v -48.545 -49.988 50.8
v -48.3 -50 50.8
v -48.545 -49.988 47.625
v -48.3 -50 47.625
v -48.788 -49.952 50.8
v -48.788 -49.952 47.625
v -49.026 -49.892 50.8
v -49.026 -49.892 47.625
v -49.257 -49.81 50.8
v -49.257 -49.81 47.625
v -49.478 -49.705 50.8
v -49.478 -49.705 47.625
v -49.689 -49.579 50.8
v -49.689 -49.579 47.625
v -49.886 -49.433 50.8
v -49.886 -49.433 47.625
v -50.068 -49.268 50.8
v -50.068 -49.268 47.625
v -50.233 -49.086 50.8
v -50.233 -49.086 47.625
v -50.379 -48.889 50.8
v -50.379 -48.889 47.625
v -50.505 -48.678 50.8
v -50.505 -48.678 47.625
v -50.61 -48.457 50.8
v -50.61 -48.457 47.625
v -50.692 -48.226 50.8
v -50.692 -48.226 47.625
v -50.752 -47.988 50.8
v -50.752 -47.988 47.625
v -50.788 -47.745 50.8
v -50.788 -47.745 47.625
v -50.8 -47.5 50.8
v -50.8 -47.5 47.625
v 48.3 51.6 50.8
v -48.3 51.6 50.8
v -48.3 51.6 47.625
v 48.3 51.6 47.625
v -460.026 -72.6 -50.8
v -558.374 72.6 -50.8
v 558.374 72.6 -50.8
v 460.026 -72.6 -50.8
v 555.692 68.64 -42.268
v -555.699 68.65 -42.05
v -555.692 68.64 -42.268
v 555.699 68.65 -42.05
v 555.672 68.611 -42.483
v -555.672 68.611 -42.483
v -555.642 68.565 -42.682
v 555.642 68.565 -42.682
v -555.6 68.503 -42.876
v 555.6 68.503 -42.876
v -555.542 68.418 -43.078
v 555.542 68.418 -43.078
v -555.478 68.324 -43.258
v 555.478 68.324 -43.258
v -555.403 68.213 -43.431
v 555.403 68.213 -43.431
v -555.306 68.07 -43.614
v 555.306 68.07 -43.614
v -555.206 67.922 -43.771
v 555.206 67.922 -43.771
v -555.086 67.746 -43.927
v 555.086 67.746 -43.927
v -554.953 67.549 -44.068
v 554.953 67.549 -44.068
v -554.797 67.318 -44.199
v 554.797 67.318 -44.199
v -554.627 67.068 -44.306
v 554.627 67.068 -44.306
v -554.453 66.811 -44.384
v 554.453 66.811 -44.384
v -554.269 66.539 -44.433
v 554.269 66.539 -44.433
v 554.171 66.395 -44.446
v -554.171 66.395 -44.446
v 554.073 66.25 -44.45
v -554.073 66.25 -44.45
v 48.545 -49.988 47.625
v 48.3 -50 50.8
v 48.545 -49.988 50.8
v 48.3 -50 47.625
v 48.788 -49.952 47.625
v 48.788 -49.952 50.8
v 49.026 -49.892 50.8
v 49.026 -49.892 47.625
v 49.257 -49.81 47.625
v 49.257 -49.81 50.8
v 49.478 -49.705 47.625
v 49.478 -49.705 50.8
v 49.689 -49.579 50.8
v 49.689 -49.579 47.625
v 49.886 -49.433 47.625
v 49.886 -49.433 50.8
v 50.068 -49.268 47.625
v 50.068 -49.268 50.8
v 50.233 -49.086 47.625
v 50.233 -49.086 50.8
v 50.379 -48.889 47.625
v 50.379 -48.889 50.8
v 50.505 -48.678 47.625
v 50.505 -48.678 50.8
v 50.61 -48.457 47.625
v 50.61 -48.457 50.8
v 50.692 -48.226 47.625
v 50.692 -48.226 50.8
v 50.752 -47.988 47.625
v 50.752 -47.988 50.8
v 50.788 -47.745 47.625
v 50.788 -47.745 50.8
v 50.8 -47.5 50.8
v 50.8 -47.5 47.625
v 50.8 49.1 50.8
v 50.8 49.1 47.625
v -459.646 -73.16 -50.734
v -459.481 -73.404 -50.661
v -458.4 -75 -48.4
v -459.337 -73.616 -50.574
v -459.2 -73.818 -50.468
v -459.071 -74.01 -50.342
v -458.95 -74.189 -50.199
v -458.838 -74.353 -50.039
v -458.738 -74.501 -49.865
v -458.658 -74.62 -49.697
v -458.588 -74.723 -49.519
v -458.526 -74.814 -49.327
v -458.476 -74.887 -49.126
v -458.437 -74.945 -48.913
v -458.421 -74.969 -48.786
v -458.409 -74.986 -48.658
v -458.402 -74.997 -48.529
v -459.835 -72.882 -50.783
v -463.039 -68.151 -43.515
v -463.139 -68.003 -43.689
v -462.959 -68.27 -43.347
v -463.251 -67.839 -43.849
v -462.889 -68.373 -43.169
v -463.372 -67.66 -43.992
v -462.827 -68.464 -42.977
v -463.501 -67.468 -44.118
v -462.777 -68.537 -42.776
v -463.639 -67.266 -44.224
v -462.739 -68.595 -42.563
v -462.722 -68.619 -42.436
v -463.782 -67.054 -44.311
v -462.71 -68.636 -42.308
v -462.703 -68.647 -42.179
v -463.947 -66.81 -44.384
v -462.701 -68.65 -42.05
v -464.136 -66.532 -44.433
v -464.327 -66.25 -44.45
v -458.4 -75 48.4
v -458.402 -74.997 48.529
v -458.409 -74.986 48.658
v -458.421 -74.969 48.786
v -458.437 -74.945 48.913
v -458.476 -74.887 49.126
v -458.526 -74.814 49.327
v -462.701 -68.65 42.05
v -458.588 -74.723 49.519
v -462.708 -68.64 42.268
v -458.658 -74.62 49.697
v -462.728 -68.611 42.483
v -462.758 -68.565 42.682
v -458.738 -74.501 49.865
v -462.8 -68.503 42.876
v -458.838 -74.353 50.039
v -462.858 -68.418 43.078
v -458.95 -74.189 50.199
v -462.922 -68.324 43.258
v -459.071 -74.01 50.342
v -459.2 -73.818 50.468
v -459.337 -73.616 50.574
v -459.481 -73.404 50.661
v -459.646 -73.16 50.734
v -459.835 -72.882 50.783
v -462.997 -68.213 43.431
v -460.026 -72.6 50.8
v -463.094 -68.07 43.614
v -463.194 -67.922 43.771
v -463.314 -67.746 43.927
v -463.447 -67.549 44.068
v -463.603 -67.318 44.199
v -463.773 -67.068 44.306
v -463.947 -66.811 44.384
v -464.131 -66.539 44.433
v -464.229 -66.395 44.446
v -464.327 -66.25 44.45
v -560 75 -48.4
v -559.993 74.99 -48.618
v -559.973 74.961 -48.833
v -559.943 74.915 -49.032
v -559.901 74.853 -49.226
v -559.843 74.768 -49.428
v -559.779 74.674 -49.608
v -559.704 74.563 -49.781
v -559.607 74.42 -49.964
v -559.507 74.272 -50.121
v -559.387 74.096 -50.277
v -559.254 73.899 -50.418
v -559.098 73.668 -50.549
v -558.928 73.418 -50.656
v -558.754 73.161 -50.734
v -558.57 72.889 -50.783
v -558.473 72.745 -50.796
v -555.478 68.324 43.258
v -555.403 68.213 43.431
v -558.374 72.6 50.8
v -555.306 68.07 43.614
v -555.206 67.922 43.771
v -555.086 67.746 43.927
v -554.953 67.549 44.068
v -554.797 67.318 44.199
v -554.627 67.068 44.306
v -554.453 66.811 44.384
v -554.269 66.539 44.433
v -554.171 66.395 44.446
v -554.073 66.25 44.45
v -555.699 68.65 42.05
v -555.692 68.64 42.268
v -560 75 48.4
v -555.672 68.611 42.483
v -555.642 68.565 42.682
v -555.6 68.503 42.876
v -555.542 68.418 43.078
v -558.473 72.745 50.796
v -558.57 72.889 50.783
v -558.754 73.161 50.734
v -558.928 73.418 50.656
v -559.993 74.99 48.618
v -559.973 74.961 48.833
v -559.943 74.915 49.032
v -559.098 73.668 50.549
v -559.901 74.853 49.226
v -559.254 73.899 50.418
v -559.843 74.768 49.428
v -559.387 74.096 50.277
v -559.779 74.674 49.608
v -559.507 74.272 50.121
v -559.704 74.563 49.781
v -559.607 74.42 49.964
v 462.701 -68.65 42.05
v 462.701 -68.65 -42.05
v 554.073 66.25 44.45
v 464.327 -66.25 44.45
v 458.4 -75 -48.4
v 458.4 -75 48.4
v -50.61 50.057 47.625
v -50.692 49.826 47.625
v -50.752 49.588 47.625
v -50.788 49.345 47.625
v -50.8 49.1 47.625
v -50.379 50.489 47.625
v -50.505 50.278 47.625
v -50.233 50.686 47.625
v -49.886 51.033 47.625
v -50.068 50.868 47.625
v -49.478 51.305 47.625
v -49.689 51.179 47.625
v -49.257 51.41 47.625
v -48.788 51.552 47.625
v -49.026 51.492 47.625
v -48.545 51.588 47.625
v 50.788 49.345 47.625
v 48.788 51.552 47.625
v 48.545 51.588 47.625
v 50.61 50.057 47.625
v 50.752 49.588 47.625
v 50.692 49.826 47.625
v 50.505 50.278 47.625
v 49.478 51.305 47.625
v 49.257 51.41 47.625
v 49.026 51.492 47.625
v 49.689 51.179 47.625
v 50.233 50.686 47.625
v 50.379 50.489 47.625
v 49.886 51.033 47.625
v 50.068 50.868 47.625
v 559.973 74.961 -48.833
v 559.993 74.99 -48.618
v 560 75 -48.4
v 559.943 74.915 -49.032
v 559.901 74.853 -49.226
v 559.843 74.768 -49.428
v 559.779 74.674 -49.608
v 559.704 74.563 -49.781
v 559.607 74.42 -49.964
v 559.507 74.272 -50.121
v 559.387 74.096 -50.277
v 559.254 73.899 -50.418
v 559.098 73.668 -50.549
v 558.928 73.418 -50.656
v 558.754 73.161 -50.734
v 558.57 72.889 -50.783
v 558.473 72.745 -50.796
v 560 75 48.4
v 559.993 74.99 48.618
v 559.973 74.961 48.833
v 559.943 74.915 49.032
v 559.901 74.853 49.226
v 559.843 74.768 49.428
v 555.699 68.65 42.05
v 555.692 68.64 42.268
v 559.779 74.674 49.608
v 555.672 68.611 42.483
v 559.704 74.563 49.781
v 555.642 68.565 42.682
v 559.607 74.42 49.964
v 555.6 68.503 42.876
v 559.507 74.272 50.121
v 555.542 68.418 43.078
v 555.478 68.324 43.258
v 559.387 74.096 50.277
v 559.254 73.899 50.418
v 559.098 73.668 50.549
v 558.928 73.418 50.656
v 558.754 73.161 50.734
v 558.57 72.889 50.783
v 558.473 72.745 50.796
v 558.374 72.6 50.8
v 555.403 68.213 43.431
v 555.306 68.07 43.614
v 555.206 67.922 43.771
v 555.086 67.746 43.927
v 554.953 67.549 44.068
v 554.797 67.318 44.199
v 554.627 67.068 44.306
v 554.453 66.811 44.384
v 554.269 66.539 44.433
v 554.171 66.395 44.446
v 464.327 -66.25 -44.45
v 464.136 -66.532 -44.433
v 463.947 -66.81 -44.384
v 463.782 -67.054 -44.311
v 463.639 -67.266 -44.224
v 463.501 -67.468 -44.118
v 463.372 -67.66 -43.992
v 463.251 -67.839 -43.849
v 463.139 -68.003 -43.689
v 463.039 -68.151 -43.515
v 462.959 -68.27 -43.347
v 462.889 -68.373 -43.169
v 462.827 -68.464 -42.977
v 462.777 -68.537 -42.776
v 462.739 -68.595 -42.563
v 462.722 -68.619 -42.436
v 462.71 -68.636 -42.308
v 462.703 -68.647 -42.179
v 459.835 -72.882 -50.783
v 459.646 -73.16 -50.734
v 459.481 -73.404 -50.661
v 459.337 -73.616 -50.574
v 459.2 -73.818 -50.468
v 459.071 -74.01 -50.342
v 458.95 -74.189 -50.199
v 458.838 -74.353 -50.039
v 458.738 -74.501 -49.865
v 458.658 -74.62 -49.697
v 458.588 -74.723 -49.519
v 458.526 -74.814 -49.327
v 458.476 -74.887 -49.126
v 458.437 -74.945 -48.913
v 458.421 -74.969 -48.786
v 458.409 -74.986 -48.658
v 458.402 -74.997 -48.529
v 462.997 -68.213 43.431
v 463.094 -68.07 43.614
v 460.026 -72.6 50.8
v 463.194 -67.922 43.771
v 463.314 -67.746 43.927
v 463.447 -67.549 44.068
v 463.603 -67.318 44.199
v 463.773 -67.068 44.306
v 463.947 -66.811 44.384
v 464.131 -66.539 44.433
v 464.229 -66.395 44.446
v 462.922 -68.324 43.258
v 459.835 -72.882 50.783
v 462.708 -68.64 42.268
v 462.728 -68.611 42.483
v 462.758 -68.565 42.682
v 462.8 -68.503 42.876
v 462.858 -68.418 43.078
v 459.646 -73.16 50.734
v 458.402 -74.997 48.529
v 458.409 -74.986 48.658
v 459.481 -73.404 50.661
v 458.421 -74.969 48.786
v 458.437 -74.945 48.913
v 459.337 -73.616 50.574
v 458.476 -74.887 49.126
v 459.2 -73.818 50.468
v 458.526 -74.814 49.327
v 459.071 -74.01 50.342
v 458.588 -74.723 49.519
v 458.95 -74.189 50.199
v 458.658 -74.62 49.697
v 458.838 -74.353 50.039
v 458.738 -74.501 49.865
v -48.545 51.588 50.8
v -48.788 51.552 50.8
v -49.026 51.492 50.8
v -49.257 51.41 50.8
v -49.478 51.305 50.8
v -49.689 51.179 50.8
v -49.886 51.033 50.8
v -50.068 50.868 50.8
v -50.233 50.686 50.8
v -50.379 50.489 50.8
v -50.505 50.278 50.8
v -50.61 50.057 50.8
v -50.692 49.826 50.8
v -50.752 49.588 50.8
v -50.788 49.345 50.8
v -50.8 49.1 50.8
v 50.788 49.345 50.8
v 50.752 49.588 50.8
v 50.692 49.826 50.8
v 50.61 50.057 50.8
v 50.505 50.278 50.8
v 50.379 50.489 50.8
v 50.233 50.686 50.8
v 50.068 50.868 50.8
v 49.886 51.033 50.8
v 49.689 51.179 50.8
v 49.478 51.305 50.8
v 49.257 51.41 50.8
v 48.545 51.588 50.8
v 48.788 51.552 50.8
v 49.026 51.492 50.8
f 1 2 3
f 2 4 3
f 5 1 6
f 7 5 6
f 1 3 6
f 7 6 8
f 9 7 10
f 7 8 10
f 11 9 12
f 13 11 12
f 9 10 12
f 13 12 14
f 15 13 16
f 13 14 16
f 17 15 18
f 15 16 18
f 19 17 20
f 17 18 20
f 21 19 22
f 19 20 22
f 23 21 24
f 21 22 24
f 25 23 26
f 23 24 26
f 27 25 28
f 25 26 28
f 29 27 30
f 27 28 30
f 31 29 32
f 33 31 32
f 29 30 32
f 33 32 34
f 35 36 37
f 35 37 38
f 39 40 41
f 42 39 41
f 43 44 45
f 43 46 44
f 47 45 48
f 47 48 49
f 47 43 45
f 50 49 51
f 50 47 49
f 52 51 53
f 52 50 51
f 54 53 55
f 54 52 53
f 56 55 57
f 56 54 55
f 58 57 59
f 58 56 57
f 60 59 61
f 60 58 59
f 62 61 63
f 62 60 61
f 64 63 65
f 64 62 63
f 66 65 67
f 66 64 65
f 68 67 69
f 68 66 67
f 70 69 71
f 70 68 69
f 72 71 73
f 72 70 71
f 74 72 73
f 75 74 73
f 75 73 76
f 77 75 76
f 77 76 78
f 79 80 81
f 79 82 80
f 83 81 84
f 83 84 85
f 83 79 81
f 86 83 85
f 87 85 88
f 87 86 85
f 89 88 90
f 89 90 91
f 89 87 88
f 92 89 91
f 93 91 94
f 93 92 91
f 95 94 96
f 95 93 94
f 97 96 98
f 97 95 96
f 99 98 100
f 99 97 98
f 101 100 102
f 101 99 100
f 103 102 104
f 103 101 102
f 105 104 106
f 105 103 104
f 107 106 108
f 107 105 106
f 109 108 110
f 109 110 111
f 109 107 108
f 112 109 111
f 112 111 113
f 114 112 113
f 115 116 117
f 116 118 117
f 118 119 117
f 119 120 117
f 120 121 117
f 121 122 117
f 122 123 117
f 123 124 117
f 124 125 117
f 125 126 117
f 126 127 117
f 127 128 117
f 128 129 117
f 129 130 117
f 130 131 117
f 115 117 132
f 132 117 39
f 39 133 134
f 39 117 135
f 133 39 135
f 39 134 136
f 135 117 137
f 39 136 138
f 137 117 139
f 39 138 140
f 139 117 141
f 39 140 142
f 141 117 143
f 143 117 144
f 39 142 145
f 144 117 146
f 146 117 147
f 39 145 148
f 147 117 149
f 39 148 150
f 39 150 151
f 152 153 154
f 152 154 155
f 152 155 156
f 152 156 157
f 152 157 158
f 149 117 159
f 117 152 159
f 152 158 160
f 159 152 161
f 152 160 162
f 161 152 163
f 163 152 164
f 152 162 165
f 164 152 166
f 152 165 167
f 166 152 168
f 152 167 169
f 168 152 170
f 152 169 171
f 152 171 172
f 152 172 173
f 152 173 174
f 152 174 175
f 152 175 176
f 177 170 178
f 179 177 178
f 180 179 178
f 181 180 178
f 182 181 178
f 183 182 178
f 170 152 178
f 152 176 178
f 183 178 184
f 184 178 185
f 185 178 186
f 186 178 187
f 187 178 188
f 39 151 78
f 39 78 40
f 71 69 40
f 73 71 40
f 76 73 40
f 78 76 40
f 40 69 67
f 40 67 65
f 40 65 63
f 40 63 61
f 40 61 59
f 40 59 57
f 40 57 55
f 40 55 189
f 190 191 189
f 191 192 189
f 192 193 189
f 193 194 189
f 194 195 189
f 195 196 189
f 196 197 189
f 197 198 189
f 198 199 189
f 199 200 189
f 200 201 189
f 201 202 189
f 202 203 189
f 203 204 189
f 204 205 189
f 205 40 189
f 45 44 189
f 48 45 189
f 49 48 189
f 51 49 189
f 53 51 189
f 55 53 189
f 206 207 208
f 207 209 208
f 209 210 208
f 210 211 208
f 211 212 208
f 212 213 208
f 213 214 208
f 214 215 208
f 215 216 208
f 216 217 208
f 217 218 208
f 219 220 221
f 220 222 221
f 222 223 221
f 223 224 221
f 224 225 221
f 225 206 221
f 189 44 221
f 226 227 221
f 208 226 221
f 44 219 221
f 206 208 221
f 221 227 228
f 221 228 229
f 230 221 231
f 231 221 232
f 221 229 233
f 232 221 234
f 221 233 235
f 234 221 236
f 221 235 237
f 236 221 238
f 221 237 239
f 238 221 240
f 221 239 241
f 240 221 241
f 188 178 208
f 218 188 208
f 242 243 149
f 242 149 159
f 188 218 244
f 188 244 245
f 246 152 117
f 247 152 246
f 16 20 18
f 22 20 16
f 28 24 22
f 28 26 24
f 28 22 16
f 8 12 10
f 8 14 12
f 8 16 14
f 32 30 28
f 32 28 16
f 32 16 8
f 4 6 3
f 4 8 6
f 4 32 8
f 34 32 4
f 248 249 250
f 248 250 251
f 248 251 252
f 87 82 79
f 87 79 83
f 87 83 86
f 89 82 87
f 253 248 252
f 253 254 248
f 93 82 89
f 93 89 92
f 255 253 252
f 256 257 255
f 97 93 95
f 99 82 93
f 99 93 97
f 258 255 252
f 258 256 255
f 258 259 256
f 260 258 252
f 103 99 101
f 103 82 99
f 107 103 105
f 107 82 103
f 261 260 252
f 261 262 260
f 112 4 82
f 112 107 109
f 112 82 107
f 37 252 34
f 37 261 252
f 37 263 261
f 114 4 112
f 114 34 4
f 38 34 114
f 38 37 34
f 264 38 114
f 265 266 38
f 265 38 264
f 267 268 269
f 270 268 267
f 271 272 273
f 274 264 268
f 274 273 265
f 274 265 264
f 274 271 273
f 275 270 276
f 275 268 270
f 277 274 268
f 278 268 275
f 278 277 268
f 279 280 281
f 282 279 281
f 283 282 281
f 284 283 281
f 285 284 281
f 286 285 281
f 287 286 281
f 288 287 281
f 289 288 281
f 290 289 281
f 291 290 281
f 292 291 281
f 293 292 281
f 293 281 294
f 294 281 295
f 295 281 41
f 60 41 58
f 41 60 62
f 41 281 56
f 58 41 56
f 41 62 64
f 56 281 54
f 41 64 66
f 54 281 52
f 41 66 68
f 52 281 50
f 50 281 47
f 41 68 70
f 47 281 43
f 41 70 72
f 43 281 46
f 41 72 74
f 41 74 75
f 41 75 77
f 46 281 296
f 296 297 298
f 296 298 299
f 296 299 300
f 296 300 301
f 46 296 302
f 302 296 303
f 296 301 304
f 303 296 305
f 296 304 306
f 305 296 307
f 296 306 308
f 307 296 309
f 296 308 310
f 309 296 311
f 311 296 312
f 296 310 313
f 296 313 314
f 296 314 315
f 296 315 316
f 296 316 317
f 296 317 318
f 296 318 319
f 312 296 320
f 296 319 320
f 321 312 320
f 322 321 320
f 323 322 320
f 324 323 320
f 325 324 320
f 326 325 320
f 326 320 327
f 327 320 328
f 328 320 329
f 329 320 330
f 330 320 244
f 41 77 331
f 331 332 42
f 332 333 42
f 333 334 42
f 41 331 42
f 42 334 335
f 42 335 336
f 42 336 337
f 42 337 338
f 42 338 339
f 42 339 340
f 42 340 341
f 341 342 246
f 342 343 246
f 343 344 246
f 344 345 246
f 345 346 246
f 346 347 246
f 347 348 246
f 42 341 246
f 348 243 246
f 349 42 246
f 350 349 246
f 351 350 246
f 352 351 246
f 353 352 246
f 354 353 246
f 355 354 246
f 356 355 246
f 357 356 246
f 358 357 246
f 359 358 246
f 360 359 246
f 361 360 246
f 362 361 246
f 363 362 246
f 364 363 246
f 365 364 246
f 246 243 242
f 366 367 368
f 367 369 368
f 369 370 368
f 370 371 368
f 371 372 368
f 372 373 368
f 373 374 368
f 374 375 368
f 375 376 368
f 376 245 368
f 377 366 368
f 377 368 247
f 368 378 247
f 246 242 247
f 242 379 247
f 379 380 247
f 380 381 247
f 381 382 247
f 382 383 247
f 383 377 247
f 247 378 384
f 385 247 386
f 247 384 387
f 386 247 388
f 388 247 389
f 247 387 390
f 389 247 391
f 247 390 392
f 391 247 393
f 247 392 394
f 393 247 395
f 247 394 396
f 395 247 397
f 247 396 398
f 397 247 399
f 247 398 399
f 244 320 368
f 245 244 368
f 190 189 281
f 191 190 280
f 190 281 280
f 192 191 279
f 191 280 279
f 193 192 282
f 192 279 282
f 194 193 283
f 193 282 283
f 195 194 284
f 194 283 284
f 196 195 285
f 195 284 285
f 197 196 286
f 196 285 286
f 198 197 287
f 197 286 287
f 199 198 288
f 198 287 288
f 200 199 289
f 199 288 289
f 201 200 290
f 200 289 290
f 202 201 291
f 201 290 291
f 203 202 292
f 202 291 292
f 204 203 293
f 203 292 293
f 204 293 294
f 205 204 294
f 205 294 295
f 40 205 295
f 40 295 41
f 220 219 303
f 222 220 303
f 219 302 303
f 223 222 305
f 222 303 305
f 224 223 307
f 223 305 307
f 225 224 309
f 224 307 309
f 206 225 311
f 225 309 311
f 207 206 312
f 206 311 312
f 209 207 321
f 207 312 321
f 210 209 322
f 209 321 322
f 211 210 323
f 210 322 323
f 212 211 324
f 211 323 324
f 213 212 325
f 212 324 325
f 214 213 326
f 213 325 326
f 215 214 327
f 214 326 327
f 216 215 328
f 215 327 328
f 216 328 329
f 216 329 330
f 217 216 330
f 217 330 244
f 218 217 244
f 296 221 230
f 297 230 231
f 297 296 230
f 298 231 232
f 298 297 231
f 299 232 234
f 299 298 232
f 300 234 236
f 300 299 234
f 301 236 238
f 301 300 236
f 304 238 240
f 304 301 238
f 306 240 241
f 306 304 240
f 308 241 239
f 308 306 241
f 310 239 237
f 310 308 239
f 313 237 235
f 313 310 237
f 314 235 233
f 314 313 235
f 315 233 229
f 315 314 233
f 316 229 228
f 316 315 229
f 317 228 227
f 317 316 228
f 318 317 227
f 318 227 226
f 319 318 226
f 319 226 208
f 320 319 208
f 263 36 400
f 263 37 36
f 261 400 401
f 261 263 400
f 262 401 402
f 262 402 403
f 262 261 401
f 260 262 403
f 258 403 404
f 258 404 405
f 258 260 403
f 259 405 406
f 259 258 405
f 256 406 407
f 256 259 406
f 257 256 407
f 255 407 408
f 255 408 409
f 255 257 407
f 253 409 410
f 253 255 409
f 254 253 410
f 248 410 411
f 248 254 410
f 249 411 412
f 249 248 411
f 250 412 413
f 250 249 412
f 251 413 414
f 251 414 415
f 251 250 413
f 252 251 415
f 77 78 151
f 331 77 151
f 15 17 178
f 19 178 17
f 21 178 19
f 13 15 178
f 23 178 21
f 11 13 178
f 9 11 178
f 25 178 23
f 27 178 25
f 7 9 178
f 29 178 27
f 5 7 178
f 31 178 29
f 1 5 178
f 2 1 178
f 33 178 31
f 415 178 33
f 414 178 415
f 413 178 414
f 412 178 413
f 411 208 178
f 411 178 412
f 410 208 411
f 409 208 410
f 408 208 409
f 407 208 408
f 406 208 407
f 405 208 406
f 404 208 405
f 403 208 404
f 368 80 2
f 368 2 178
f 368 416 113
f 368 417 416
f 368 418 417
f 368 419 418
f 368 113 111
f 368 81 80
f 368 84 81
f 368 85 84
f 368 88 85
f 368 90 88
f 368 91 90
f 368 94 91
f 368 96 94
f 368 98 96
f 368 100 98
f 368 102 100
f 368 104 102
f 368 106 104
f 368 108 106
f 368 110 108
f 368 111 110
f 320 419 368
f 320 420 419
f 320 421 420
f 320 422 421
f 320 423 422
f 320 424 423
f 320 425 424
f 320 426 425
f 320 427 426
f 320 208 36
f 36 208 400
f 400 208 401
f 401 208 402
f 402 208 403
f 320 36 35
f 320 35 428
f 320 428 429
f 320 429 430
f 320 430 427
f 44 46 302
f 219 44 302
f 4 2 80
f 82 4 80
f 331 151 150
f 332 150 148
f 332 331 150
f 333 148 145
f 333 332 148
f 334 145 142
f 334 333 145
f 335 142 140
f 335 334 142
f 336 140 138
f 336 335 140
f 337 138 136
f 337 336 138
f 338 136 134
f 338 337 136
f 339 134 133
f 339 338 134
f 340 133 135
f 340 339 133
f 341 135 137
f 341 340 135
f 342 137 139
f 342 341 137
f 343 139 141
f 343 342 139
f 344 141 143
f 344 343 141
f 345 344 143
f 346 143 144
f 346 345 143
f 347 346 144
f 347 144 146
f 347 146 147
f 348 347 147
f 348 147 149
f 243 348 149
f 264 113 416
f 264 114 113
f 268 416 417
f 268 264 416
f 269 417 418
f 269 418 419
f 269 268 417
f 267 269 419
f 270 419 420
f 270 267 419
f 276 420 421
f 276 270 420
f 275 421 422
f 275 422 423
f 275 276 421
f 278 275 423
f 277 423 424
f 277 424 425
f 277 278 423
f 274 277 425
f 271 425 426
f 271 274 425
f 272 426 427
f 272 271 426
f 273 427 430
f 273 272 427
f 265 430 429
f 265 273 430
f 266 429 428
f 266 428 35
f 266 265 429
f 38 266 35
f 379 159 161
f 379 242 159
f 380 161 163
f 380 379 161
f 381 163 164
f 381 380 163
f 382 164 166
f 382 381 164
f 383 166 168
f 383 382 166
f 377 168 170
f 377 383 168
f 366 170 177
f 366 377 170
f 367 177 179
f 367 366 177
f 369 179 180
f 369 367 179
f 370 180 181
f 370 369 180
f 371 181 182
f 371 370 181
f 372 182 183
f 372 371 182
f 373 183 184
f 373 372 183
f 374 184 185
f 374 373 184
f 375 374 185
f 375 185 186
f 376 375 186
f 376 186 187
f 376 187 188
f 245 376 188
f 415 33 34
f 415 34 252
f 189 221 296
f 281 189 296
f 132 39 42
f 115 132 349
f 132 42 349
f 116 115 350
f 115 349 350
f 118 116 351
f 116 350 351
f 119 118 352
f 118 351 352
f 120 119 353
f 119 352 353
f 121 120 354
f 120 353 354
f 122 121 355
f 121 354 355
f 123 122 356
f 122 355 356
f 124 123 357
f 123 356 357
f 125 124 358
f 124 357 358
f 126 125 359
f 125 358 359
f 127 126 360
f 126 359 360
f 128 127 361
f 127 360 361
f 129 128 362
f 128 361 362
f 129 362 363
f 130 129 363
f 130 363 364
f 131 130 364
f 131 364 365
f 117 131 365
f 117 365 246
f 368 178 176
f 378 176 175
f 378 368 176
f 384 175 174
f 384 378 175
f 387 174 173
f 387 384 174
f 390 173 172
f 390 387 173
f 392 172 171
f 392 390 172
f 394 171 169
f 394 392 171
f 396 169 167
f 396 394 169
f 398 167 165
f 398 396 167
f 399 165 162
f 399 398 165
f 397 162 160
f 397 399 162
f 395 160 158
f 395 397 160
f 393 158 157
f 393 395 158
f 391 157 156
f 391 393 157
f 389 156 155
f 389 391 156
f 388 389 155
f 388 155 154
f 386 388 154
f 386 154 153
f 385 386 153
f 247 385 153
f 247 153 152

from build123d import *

# Parameters (mm, degrees)
F0_W      = 1120
F0_H      = 150
F1_DEPTH  = 50.8
F2_W      = 137.3
F2_H      = 88.9
F3_DEPTH  = 1120
F5_DEPTH  = 101.601
F7_DEPTH  = 101.601
F8_R      = 2.4
F9_W      = 101.6
F9_H      = 101.6
F10_DEPTH = 3.175
F11_R     = 2.5


with BuildPart() as f1:
    # F0 (on Top) → F1 (new body, symmetric)
    with BuildSketch(Plane.XY):
        Rectangle(F0_W, F0_H)
    extrude(amount=F1_DEPTH, both=True)

    # F2 (on face) → F3 (cut, through all)
    with BuildSketch(Plane(origin=(-560, 0, 0), x_dir=(0, -1, 0), z_dir=(-1, 0, 0))):
        Rectangle(F2_W, F2_H)
    extrude(amount=-F3_DEPTH, mode=Mode.SUBTRACT)

    # F4 (on face) → F5 (cut, through all)
    with BuildSketch(Plane.XY.offset(50.8)):
        Polygon((458.4, -75), (560, -75), (560, 75), align=None)
    extrude(amount=-F5_DEPTH, mode=Mode.SUBTRACT)

    # F6 (on face) → F7 (cut, through all)
    with BuildSketch(Plane.XY.offset(50.8)):
        Polygon((-560, 75), (-560, -75), (-458.4, -75), align=None)
    extrude(amount=-F7_DEPTH, mode=Mode.SUBTRACT)

    # F8
    f8_edges = [f1.edges().sort_by_distance(p)[0] for p in [
        (0, -75, 50.8),
        (0, -75, -50.8),
        (0, 75, -50.8),
        (0, 75, 50.8),
        (0, 68.65, -44.45),
        (0, 68.65, 44.45),
        (0, -68.65, 44.45),
        (0, -68.65, -44.45),
    ]]
    fillet(f8_edges, radius=F8_R)

    # F9 (on face) → F10 (cut)
    with BuildSketch(Plane.XY.offset(50.8)):
        with Locations((0, 0.8)):
            Rectangle(F9_W, F9_H)
    extrude(amount=-F10_DEPTH, mode=Mode.SUBTRACT)

    # F11
    f11_edges = [f1.edges().sort_by_distance(p)[0] for p in [
        (50.8, 51.6, 49.2125),
        (50.8, -50, 49.2125),
        (-50.8, -50, 49.2125),
        (-50.8, 51.6, 49.2125),
    ]]
    fillet(f11_edges, radius=F11_R)


solid = f1.part
